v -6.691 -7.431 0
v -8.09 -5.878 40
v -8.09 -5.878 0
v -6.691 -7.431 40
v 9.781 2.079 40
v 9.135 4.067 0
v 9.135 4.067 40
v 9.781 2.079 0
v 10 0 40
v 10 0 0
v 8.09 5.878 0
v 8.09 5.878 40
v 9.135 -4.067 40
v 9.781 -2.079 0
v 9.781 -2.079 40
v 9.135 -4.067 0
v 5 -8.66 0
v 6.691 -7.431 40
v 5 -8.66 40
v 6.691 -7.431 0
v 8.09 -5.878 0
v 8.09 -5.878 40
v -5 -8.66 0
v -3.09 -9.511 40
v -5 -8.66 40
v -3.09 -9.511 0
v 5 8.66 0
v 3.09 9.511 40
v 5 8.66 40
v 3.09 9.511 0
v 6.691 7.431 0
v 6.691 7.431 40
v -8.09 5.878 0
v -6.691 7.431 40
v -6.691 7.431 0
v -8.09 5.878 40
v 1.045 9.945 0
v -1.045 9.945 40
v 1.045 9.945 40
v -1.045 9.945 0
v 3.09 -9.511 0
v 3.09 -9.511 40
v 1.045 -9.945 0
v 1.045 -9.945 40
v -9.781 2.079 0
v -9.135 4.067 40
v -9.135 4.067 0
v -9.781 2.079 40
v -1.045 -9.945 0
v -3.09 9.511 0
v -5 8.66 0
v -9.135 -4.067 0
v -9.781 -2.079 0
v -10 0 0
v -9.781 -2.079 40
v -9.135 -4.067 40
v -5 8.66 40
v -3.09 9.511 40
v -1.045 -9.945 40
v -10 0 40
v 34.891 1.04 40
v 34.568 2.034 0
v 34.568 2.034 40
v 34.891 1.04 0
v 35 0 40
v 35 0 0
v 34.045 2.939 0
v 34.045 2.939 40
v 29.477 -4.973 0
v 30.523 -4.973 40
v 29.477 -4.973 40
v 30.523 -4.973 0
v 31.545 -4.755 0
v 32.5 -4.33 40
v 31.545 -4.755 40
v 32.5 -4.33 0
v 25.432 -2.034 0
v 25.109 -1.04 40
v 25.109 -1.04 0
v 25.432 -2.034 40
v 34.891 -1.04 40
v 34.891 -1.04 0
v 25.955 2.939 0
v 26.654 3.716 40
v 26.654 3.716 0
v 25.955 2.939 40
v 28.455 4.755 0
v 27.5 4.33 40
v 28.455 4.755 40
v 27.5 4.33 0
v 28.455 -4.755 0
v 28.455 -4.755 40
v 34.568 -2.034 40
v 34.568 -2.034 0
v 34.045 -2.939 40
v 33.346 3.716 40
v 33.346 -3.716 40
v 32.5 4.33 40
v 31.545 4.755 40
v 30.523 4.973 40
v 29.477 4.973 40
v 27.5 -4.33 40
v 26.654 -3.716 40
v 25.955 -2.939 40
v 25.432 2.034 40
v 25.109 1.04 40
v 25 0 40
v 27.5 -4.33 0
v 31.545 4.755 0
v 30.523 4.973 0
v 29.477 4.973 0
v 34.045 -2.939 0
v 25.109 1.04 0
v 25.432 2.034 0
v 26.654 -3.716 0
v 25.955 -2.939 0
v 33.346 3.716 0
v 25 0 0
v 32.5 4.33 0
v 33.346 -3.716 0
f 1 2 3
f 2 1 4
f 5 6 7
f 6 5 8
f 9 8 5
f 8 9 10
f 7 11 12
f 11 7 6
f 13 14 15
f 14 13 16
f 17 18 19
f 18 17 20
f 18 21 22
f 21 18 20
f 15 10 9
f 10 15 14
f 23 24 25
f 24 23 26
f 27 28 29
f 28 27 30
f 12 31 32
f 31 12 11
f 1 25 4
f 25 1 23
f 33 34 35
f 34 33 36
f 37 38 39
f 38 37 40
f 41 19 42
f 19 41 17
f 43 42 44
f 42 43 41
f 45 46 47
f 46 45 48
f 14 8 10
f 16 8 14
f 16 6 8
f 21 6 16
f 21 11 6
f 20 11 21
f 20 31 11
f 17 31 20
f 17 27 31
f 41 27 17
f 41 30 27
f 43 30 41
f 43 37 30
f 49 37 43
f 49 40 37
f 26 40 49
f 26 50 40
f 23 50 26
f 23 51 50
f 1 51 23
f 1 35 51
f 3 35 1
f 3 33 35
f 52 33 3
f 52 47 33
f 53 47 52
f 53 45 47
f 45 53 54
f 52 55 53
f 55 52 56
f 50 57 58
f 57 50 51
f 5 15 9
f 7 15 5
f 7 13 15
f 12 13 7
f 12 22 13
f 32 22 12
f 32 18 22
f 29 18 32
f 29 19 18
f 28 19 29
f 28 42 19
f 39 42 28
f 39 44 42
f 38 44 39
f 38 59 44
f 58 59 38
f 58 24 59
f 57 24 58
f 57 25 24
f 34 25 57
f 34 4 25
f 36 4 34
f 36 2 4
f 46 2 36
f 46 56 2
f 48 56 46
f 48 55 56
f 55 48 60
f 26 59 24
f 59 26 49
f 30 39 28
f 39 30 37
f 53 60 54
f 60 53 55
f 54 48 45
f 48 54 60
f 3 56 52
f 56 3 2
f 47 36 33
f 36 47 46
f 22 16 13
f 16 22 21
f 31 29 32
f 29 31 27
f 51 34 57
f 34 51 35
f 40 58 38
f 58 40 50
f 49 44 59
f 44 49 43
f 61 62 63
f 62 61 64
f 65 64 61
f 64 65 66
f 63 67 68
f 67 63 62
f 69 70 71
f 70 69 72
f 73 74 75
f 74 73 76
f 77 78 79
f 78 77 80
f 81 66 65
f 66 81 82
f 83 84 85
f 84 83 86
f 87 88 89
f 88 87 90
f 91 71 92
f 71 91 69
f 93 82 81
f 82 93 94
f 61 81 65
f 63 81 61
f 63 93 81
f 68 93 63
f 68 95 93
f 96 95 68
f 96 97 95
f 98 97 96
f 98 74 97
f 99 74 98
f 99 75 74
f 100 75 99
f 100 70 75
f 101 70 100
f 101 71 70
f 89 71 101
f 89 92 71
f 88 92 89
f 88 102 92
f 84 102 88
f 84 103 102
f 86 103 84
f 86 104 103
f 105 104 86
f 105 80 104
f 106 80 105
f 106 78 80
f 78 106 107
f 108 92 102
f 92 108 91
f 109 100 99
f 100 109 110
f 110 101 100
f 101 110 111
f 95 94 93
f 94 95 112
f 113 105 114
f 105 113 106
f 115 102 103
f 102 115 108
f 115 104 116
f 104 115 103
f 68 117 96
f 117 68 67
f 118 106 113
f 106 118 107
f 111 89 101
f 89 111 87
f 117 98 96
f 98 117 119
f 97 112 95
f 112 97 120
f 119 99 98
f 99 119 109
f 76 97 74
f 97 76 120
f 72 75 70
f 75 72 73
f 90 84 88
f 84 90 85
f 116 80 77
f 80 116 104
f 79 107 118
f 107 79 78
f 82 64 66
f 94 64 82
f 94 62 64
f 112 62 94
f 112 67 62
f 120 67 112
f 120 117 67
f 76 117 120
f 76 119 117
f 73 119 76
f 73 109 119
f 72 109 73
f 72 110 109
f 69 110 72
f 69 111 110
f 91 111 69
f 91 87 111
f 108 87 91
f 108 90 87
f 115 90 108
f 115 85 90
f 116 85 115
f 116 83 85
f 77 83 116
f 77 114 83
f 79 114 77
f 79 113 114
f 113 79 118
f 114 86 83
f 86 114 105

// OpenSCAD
$fs=0.1;
cylinder(r=10,h=40);
translate([30,0,0])cylinder(r=5,h=40);

//screen capture settings
$vpr=[70,0,25];
$vpd=140;
$vpt=[8,15,16];
